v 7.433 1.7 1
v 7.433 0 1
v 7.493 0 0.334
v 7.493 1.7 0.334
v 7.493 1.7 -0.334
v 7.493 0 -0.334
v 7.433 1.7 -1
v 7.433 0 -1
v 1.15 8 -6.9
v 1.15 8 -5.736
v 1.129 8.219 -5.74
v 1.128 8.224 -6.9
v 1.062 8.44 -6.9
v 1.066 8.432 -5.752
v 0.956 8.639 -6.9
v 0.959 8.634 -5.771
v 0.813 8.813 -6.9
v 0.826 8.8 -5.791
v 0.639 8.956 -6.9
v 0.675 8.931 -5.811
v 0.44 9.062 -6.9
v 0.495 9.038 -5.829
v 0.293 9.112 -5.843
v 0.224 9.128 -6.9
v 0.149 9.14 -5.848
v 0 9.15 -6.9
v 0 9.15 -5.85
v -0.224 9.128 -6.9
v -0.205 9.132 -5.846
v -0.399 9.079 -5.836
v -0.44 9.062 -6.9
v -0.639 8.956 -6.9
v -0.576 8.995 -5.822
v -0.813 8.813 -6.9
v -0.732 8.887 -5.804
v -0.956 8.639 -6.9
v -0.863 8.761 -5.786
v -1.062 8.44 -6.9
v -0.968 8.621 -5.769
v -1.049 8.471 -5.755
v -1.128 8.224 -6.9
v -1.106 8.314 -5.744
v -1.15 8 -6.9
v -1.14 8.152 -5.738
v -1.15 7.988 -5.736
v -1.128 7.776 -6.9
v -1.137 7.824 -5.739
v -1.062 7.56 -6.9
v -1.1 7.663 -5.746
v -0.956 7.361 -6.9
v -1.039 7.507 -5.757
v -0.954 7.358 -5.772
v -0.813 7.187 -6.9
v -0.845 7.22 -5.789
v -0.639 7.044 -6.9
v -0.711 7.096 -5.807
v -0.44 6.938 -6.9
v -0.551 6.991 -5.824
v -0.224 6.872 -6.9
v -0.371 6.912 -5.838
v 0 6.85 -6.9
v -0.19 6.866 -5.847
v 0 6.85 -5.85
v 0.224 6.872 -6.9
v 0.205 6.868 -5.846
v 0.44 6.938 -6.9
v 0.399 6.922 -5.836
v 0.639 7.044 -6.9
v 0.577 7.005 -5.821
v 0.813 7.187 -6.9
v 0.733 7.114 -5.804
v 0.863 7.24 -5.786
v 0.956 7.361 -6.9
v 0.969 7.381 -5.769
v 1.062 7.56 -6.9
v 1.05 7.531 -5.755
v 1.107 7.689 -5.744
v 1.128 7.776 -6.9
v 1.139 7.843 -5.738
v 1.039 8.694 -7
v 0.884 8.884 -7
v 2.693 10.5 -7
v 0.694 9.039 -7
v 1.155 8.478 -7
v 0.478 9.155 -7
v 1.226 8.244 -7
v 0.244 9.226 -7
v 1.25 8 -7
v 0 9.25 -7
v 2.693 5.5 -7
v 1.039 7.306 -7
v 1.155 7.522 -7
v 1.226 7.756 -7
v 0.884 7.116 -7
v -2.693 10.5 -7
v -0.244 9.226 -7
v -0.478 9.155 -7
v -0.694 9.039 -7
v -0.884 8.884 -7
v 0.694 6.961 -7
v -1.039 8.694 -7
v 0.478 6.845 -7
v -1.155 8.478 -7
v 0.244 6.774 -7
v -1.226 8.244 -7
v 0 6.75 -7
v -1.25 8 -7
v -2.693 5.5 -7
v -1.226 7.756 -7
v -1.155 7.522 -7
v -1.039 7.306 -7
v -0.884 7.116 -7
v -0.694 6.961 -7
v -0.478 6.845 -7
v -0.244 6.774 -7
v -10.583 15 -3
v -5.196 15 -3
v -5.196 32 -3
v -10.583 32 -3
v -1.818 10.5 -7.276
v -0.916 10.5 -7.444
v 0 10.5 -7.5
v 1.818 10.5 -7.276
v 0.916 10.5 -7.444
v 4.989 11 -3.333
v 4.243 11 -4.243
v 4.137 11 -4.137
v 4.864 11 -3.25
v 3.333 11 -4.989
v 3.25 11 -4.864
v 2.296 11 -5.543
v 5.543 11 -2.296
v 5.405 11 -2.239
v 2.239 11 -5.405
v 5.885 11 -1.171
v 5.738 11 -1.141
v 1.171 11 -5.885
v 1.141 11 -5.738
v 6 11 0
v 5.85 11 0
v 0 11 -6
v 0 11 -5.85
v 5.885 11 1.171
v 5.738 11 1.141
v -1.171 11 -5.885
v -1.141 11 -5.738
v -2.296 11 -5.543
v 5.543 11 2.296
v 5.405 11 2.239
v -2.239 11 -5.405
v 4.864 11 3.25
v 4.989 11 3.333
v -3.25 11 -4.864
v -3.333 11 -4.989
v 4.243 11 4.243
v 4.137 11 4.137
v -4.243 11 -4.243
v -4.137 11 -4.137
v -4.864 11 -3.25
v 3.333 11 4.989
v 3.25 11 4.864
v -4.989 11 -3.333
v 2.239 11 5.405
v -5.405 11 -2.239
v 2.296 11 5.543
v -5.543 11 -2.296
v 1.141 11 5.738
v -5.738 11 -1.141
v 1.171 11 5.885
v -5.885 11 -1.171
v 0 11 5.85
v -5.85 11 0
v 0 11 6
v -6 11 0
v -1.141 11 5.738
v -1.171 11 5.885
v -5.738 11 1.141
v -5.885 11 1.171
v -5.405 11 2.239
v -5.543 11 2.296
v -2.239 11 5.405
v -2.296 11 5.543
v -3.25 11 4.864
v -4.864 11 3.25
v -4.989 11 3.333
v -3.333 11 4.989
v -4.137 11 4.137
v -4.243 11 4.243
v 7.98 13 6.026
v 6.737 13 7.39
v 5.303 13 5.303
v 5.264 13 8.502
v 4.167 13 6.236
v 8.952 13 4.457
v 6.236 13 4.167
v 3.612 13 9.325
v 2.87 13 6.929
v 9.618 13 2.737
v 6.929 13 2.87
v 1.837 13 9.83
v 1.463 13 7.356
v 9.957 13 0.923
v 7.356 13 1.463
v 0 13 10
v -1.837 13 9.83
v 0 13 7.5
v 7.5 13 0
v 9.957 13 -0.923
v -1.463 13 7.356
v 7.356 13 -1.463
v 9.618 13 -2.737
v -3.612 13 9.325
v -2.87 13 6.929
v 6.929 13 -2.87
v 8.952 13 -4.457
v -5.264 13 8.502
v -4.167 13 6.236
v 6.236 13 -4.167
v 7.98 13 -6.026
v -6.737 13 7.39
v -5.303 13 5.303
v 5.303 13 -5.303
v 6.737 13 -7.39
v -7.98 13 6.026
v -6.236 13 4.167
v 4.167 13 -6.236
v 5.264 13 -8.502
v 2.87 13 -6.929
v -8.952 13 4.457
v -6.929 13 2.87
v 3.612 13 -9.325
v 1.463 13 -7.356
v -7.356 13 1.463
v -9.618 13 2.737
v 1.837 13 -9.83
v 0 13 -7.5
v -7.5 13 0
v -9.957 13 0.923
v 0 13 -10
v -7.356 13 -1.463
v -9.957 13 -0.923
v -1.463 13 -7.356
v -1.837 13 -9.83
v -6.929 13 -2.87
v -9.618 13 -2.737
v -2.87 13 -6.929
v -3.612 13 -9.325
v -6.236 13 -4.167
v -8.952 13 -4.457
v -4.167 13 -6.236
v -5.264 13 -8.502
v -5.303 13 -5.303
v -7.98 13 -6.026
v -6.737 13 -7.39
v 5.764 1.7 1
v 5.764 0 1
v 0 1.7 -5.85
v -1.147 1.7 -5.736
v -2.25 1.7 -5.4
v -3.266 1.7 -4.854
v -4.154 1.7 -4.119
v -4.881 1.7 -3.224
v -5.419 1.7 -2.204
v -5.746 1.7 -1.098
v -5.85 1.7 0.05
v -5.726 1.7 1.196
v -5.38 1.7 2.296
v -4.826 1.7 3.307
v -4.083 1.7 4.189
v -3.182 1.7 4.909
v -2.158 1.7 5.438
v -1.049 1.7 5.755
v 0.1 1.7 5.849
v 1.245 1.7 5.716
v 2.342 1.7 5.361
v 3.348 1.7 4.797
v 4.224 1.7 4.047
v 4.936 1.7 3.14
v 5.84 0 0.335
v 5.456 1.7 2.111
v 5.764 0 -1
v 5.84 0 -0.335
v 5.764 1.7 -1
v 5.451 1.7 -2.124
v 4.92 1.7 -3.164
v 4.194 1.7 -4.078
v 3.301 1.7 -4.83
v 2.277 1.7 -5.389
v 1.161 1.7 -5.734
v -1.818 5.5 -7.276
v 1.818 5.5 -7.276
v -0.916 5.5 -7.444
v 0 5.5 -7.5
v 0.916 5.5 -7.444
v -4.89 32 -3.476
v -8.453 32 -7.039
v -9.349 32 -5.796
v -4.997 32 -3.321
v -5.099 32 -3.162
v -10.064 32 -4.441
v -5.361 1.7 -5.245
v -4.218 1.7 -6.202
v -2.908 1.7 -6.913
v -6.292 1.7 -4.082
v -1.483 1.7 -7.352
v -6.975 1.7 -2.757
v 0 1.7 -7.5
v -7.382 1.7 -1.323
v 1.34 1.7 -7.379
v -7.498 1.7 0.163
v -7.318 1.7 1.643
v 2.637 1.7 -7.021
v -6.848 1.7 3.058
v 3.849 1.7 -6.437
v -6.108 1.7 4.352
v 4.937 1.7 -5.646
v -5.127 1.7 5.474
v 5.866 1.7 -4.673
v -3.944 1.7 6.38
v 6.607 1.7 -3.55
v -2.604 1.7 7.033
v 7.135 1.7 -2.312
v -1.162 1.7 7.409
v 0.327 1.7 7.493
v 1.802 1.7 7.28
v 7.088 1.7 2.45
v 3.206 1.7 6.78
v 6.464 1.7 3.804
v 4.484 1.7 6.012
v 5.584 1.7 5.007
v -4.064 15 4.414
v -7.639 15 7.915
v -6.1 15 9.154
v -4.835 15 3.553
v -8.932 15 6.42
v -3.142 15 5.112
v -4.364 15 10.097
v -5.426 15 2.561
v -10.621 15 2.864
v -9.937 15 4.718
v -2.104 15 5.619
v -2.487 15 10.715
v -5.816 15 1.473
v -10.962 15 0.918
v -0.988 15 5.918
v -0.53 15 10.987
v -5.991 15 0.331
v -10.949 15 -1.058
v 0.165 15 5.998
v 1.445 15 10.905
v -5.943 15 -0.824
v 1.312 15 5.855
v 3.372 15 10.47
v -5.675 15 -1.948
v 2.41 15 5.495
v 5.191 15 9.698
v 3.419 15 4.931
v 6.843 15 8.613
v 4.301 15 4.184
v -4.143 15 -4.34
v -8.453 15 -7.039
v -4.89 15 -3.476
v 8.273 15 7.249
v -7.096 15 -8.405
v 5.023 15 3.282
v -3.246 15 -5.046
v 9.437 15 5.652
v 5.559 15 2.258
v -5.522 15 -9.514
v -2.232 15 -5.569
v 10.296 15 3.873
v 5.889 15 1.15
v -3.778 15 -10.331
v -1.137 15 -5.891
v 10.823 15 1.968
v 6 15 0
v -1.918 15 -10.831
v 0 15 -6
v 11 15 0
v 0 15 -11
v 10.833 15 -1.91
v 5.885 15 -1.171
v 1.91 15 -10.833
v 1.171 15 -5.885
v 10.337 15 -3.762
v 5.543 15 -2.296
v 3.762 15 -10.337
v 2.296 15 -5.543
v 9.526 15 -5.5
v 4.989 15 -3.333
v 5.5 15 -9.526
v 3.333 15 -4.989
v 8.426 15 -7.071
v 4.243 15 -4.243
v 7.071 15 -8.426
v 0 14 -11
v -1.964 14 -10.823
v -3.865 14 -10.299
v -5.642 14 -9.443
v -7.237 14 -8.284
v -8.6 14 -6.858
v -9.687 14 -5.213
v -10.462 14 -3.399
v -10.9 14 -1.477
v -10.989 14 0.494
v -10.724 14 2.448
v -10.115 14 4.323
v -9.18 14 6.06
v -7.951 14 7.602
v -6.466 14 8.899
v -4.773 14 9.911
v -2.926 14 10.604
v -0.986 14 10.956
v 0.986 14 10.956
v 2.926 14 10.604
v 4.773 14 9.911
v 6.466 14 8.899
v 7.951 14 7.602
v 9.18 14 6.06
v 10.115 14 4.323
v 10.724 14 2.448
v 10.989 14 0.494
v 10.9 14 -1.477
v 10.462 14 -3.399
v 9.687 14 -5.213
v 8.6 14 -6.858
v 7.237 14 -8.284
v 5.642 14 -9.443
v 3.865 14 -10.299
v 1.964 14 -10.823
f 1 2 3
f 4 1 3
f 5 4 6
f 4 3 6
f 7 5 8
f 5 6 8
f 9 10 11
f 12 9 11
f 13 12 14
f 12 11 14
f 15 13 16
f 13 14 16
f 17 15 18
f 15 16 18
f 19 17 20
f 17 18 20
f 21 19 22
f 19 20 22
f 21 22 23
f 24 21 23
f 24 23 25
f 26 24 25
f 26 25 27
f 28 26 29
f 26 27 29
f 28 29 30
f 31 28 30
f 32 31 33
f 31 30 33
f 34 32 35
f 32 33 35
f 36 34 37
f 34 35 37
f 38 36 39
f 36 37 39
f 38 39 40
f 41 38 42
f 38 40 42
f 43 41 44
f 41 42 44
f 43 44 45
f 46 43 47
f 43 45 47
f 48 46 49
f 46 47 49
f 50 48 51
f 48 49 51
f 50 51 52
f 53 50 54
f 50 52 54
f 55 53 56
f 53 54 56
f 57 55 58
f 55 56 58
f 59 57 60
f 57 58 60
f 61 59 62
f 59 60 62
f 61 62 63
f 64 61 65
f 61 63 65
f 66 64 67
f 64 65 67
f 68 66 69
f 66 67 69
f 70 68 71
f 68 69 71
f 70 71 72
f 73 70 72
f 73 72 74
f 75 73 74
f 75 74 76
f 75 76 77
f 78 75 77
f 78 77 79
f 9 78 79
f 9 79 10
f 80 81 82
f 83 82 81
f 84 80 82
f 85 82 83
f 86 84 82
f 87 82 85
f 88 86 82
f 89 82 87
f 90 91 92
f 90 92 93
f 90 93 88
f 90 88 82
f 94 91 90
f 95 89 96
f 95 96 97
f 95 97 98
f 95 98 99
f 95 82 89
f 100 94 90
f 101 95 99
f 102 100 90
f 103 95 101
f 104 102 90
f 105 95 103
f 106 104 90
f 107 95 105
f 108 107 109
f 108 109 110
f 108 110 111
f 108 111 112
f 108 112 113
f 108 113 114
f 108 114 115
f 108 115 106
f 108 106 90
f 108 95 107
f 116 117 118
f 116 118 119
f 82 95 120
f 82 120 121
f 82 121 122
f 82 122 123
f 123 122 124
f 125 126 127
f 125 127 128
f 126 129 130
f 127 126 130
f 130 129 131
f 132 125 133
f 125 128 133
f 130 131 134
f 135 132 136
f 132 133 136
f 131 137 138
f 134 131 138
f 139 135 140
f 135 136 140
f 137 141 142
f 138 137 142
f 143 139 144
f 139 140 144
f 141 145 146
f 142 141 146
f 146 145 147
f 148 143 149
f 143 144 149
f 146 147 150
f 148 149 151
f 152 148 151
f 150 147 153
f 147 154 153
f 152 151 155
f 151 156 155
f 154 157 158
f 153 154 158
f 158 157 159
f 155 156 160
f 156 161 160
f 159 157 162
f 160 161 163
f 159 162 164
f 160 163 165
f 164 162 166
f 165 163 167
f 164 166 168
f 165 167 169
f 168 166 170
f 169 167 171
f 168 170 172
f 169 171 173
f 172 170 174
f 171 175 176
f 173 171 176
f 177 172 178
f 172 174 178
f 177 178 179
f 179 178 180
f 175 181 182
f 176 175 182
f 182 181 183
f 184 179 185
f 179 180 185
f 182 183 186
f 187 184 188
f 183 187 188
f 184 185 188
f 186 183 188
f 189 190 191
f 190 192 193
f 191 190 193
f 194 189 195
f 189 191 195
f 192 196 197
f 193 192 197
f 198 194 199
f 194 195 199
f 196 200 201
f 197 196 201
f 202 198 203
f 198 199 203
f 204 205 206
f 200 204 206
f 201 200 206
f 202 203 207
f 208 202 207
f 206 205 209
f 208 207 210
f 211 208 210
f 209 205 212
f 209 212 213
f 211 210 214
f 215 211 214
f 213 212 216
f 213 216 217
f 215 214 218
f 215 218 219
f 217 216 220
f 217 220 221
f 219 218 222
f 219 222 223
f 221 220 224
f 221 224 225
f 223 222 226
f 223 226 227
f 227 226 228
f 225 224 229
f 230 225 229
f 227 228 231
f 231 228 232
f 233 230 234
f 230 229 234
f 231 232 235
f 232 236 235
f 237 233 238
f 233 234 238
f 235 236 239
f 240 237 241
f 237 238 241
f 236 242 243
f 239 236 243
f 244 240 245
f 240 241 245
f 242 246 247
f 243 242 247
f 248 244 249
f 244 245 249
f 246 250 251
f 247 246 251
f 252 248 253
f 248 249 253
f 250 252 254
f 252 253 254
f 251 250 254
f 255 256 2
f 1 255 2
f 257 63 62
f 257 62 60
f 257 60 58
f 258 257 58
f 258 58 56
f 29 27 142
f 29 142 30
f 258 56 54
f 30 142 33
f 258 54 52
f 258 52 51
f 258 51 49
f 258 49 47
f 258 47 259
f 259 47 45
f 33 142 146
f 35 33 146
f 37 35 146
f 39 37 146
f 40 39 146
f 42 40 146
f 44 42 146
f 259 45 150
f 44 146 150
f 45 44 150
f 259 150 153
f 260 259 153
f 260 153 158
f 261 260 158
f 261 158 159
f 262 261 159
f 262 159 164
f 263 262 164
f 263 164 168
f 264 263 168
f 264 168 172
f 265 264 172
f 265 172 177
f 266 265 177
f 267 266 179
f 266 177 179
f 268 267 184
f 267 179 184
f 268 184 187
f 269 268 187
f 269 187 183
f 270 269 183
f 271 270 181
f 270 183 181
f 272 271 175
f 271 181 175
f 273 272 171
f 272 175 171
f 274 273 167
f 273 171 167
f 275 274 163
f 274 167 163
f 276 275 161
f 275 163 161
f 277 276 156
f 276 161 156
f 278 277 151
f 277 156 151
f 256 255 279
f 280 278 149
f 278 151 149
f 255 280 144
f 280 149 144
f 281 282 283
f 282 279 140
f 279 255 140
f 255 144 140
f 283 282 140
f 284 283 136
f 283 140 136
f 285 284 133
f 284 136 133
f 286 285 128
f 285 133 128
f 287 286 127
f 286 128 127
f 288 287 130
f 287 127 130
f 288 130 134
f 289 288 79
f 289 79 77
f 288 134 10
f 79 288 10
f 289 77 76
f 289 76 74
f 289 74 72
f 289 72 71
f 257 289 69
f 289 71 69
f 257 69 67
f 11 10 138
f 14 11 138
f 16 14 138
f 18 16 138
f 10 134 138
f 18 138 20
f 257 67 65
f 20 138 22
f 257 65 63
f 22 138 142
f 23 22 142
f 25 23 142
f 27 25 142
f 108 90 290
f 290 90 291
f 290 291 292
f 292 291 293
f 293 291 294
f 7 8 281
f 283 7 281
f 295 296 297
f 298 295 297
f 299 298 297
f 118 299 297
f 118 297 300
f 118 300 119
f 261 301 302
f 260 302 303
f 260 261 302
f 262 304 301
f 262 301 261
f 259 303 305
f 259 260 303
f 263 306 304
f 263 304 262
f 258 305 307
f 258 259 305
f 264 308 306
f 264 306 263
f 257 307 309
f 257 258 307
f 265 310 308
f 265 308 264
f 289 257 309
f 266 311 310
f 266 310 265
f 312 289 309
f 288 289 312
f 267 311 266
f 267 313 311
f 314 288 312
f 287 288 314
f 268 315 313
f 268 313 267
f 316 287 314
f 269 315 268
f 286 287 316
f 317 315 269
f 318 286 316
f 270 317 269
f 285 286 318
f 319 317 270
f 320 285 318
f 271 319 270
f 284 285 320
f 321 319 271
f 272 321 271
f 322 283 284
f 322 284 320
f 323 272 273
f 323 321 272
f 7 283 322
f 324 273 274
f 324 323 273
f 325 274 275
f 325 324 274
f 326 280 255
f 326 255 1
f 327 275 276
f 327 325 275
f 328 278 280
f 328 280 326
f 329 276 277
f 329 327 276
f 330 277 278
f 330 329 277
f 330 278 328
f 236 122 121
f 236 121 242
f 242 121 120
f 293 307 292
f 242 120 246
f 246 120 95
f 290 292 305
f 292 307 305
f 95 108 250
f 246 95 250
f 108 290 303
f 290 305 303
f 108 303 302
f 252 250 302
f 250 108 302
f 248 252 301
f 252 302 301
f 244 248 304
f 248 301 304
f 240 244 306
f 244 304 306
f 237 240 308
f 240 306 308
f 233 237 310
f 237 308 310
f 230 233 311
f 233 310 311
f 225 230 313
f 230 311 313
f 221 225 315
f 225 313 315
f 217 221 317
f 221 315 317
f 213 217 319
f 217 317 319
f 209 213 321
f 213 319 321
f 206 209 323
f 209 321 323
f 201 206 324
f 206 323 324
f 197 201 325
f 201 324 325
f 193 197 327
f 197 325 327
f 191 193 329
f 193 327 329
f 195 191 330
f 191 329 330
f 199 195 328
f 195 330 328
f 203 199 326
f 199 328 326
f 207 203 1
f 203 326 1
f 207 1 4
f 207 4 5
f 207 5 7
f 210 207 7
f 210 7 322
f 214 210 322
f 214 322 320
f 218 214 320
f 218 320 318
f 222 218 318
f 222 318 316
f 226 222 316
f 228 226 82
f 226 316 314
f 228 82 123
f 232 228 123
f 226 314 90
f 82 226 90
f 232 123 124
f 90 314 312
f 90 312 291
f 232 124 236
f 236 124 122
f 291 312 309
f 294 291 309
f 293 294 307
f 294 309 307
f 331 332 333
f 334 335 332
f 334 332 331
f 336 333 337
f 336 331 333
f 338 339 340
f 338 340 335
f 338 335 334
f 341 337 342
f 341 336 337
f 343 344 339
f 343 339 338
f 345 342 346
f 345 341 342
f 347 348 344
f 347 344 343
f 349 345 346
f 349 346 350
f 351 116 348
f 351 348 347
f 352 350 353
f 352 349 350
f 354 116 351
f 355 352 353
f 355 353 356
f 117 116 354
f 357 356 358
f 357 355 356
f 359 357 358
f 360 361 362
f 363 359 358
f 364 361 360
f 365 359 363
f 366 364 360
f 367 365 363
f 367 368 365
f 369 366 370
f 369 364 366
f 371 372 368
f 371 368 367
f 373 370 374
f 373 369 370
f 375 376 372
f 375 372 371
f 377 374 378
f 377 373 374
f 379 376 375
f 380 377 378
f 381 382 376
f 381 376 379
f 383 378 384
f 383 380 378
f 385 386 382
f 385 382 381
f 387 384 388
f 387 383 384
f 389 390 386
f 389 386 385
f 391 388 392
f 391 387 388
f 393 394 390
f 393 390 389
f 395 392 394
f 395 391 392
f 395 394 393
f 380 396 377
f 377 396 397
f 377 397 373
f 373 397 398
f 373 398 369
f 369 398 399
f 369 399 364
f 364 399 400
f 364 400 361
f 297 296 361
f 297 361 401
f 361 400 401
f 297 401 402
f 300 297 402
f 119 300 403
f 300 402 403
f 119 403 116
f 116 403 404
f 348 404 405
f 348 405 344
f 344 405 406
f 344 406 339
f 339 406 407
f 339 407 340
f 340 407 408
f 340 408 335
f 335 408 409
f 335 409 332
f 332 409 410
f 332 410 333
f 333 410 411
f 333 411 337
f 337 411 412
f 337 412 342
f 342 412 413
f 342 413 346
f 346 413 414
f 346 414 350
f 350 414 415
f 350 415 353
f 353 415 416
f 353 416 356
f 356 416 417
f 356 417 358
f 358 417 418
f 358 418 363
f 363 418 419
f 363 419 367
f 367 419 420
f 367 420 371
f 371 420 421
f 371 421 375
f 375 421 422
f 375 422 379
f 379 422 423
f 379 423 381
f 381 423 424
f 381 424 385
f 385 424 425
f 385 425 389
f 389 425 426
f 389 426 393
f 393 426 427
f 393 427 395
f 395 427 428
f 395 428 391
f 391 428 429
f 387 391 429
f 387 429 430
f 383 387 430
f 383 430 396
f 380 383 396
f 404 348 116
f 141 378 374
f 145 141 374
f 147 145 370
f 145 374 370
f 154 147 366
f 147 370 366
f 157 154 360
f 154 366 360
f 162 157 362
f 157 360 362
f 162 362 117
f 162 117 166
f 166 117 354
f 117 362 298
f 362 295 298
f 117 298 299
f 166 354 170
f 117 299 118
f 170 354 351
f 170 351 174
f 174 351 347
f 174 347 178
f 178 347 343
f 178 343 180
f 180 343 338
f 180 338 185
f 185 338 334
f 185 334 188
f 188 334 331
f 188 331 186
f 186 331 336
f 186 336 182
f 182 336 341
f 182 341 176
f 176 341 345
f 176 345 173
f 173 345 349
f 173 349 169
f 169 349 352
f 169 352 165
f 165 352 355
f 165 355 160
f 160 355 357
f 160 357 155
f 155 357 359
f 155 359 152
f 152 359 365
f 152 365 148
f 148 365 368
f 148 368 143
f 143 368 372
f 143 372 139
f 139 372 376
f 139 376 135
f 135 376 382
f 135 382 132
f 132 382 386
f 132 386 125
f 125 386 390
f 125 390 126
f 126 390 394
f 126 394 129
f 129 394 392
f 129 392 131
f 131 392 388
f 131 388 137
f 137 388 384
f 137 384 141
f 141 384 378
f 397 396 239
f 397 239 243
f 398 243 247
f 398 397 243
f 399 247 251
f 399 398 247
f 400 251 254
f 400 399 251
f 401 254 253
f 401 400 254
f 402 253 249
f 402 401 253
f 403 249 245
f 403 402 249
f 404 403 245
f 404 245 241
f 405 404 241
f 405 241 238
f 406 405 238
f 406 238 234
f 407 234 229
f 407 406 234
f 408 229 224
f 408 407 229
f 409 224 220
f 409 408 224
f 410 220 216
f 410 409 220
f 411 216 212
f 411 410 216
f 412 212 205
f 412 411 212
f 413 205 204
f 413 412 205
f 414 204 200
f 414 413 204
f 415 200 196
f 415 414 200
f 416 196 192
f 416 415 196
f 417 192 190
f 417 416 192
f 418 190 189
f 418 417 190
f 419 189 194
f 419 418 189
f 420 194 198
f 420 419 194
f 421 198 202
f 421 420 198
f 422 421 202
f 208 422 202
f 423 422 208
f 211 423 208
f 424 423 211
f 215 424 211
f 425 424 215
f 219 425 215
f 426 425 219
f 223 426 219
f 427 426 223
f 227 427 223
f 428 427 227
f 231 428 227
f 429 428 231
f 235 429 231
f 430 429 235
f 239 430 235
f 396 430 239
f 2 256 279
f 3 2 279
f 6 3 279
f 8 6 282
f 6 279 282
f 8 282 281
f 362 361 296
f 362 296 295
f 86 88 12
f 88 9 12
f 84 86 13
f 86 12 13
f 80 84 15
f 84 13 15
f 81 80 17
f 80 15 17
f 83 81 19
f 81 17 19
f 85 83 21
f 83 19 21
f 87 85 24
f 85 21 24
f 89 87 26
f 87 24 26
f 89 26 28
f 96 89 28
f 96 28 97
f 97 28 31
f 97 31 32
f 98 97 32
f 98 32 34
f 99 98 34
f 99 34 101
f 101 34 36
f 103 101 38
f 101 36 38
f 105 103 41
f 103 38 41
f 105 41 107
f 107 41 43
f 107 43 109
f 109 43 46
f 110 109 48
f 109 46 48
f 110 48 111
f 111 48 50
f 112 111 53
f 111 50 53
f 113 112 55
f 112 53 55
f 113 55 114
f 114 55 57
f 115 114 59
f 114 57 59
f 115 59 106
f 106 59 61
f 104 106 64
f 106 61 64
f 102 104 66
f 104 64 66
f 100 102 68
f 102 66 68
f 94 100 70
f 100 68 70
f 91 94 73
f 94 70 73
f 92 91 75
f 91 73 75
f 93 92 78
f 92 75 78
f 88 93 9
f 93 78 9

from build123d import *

# Parameters (mm, degrees)
CUT_EXTRUDE_2_DEPTH      = 17
CHAMFER_1_SIZE           = 1
SKETCH_5_OUTSIDE_W       = 32.926
SKETCH_5_OUTSIDE_H       = 32.926
CUT_EXTRUDE_4_DEPTH      = 1.7
CUT_EXTRUDE_5_DEPTH      = 36.580893749
CUT_EXTRUDE_5_DEPTH_BACK = 36.580893749


# Read off the part's stored shape, not the designer's step: Диаметр отверстия Ø2.3 (2.3)1
with BuildPart() as part:
    # Эскиз1 → Повернуть1 (revolve)
    with BuildSketch(Plane.XY, mode=Mode.PRIVATE) as revolve_1_sk:
        Polygon((5.85, 0), (5.85, 11), (6, 11), (6, 32), (11, 32), (11, 13), (7.5, 13), (7.5, 0), align=None)
    revolve(revolve_1_sk.sketch.rotate(Axis((0, 0, 0), (0, 1, 0)), 90), axis=Axis((0, 0, 0), (0, 1, 0)))

    # Эскиз2 → Вырез-Вытянуть2 (cut)
    with BuildSketch(Plane(origin=(0, 32, 0), x_dir=(1, 0, 0), z_dir=(0, 1, 0))):
        with BuildLine():
            Line((-5.196152423, 3), (-10.583005244, 3))
            ThreePointArc((-10.583005244, 3), (-1.514421063, -10.895252583), (11, 0))
            ThreePointArc((11, 0), (3.74273909, 10.343689096), (-8.453073474, 7.038859911))
            Line((-8.453073474, 7.038859911), (-4.890406914, 3.476193351))
            ThreePointArc((-4.890406914, 3.476193351), (1.824494247, 5.715874451), (6, 0))
            ThreePointArc((6, 0), (-1.552914271, -5.795554958), (-5.196152423, 3))
        make_face()
    extrude(amount=-CUT_EXTRUDE_2_DEPTH, mode=Mode.SUBTRACT)

    # Фаска1
    chamfer_1_edges = [part.edges().sort_by_distance(p)[0] for p in [
        (0, 13, 11),
    ]]
    chamfer(chamfer_1_edges, length=CHAMFER_1_SIZE)

    # Эскиз5 outside → Вырез-Вытянуть4 (cut)
    with BuildSketch(Plane.XZ):
        Rectangle(SKETCH_5_OUTSIDE_W, SKETCH_5_OUTSIDE_H)
        with BuildLine():
            Line((0, 0), (3.954322794, 1))
            Line((3.954322794, 1), (7.433034374, 1))
            ThreePointArc((7.433034374, 1), (7.5, 0), (7.433034374, -1))
            Line((7.433034374, -1), (3.955330555, -1))
            Line((3.955330555, -1), (0, 0))
        make_face(mode=Mode.SUBTRACT)
    extrude(amount=-CUT_EXTRUDE_4_DEPTH, mode=Mode.SUBTRACT)

    # Эскиз6 → Вырез-Вытянуть5 (cut, two sides: drawn at the far end of the back side and taken through both)
    with BuildSketch(Plane(origin=(0, 0, 0), x_dir=(0, 0, -1), z_dir=(1, 0, 0)).offset(-CUT_EXTRUDE_5_DEPTH_BACK)):
        Polygon((82.137450445, 10.5), (7.5, 10.5), (7, 10.5), (7, 5.5), (7.5, 5.5), (82.137450445, 5.5), (231.412351334, 5.5), (231.412351334, 10.5), align=None)
    extrude(amount=CUT_EXTRUDE_5_DEPTH + CUT_EXTRUDE_5_DEPTH_BACK, mode=Mode.SUBTRACT)

    # Диаметр отверстия Ø2.3 (2.3)1 outline → Диаметр отверстия Ø2.3 (2.3)1 (revolve, cut)
    with BuildSketch(Plane.XZ.offset(-8)):
        Polygon((1.15, -6.9), (1.15, -5.735802951), (0, -5.735802951), (0, -7), (1.25, -7), align=None)
    revolve(axis=Axis((0, 8, 0), (0, 0, 1)), mode=Mode.SUBTRACT)


solid = part.part
